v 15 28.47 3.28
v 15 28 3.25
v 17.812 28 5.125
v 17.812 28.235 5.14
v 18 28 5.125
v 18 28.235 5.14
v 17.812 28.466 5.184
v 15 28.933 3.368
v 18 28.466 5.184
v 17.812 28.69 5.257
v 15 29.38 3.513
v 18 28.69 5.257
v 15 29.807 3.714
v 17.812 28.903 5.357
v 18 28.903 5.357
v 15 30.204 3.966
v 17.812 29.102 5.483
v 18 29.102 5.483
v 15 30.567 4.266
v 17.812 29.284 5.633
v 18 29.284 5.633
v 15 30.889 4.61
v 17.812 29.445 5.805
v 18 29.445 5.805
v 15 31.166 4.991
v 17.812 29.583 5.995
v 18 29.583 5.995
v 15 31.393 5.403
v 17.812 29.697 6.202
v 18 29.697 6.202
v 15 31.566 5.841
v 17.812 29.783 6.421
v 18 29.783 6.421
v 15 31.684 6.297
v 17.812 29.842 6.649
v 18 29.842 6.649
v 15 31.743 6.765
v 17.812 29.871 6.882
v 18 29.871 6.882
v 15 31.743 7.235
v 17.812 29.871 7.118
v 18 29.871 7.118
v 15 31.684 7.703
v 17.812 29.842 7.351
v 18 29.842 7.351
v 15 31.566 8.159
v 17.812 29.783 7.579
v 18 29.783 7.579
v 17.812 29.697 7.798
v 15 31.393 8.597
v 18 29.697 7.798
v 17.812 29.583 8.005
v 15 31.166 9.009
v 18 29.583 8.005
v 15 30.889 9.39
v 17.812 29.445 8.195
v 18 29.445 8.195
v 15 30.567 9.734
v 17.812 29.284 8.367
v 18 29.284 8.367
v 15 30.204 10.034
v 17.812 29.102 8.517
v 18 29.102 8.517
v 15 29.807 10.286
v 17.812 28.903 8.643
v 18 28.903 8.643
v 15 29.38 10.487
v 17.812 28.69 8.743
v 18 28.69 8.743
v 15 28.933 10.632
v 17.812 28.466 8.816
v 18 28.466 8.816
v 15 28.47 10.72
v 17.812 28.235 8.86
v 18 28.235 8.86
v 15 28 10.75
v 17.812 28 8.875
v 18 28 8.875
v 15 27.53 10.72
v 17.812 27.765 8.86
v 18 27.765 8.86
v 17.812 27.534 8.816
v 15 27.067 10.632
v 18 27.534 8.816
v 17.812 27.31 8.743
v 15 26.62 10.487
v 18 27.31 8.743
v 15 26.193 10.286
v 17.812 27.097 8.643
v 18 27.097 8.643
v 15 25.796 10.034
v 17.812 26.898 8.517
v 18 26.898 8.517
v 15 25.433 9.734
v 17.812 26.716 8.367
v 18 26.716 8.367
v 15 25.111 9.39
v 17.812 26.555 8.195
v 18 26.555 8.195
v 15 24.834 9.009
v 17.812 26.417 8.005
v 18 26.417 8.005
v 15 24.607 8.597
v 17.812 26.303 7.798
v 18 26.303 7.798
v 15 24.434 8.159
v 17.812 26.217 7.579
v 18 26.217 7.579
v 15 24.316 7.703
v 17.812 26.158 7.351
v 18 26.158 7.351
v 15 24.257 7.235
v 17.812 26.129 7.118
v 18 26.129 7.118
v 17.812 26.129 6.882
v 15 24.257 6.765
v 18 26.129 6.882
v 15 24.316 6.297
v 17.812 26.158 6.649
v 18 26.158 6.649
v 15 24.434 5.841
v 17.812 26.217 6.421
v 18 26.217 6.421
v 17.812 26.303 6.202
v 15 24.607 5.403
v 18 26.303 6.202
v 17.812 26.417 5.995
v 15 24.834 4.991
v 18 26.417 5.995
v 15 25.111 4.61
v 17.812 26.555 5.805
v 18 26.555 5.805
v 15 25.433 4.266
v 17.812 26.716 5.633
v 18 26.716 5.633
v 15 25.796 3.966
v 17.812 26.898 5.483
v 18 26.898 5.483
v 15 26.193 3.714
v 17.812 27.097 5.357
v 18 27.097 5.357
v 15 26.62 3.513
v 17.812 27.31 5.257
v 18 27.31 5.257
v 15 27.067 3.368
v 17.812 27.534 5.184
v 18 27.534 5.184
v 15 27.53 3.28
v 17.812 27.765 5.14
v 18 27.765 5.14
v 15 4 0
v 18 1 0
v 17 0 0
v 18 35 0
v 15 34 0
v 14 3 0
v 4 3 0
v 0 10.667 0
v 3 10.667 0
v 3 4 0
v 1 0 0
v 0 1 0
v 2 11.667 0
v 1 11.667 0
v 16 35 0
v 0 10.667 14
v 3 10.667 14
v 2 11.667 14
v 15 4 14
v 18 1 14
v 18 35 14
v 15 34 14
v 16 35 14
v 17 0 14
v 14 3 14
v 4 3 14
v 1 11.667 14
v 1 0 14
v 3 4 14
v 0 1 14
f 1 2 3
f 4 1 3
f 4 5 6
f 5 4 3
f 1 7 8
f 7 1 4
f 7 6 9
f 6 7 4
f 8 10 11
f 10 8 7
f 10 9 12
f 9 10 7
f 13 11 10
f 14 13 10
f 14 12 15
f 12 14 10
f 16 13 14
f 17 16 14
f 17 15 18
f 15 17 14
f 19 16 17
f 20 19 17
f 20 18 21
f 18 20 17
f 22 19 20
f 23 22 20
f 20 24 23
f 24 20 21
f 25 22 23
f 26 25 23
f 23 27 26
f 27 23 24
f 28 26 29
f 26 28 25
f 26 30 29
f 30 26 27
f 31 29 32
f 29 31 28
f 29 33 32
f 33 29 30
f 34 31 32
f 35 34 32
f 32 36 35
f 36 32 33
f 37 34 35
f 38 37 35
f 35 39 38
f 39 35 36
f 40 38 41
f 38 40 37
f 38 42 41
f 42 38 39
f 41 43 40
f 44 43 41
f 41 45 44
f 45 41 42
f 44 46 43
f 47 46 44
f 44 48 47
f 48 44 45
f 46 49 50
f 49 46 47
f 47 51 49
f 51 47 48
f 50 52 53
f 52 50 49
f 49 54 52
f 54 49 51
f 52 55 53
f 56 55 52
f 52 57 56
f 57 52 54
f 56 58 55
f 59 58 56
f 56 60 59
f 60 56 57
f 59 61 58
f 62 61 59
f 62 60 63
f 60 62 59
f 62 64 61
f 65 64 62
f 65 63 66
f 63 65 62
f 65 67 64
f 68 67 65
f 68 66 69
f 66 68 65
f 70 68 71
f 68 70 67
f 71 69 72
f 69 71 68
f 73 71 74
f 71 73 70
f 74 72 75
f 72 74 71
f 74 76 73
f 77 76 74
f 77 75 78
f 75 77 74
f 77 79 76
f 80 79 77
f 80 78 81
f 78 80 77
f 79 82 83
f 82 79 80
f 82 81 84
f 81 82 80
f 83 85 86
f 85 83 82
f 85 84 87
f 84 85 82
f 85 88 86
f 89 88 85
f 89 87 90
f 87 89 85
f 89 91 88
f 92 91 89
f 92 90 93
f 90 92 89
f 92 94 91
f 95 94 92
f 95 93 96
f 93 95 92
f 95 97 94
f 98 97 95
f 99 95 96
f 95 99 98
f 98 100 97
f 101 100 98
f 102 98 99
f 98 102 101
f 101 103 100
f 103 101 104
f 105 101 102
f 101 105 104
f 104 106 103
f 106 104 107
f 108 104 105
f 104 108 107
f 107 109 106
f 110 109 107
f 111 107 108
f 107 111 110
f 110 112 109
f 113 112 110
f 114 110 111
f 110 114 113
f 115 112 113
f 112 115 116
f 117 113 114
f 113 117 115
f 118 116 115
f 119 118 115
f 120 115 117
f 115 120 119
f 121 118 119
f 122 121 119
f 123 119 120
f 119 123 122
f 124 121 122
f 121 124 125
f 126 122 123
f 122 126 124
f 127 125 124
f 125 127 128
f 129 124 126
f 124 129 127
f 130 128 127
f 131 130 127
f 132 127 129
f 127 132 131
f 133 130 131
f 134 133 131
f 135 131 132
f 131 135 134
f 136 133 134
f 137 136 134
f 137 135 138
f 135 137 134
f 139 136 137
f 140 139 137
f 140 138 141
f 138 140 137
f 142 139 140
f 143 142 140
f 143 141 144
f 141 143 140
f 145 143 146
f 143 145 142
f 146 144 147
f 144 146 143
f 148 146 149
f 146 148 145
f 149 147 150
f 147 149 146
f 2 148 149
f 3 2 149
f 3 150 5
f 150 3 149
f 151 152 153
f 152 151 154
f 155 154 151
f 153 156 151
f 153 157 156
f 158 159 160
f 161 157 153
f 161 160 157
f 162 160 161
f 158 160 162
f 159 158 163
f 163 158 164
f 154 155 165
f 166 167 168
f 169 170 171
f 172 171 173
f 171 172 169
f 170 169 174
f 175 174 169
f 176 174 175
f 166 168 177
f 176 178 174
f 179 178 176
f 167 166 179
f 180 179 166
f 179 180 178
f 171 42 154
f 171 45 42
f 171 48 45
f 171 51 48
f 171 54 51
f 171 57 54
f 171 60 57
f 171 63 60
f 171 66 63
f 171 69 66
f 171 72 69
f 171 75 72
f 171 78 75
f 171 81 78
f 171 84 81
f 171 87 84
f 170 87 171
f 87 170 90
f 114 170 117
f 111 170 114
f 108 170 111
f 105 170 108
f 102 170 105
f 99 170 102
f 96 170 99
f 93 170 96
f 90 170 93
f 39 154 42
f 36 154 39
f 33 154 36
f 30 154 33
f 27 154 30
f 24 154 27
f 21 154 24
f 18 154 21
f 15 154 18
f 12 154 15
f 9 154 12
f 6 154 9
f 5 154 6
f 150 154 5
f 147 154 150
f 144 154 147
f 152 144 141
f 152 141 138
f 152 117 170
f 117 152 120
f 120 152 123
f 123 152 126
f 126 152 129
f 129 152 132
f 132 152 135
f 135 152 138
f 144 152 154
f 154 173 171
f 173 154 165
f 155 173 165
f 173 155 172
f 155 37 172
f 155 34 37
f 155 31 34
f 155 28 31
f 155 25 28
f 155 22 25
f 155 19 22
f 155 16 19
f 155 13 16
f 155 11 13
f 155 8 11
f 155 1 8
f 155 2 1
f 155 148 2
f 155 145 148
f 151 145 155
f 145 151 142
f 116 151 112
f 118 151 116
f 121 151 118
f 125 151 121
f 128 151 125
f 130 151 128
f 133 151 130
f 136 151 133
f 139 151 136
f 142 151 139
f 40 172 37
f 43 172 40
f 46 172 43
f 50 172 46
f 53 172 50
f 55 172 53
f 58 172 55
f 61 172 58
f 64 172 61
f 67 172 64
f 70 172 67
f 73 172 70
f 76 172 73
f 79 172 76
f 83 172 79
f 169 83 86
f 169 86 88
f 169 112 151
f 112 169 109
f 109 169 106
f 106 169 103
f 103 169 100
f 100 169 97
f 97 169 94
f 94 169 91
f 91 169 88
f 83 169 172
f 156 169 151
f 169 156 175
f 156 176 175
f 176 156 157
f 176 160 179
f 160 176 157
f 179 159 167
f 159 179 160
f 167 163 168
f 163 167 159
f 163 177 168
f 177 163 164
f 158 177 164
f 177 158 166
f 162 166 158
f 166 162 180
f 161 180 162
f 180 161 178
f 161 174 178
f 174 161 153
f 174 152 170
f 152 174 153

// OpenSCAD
// file: Parts/Screw.scad
// created by IndiePandaaaaa | Lukas

$fn = 50;

function cone_diameter(diameter) = diameter * 2;

function cone_diameter_cutout(diameter) = diameter * 2 + 0.5;

function cone_height(diameter) = diameter * 0.75;

module screw(diameter, length = 12, cutout_sample = false) {
  module base_model(diameter, length, cone_height, cone_diameter, offset = 0) {
    rotate_extrude() {
      polygon([
          [0, 0],
          [(diameter + offset) / 2, 0],
          [(diameter + offset) / 2, (length + offset) - (cone_height + offset)],
          [(cone_diameter + offset) / 2, length + offset],
          [0, length + offset],
        ]);
    }
  }

  if (length < diameter) {
    echo("Screw is too short");
    length = diameter + 5;
    echo("New length is: ", length);
  }

  if (!cutout_sample) {
    translate([0, 0, -length])
      difference() {
        base_model(diameter, length, cone_height(diameter), cone_diameter(diameter));

        // top cross part
        translate([0, 0, length - (cone_height(diameter) - diameter / 2) + .1])
          difference() {
            rotate([0, 0, 45])
              rotate_extrude() {
                polygon([
                    [0, 0],
                    [diameter * 1.4 / 2, 0],
                    [cone_diameter(diameter) / 3, cone_height(diameter) - diameter / 2],
                    [0, cone_height(diameter) - diameter / 2],
                  ]);
              }
            for (i = [0 : 1 : 3]) {
              rotate([0, 0, 90 * i])
                translate([diameter / 3.18 / 2, diameter / 3.18 / 2, 0]) cube(cone_height(diameter));
            }
          }
      }
  } else {
    offset = 0;
    diameter = cone_diameter_cutout(diameter) / 2;  // is duplicated by function, used to reduce error
    translate([0, 0, -length - offset / 2]) {
      base_model(diameter, length, cone_height(diameter), cone_diameter(diameter), offset);
      translate([0, 0, length]) cylinder(r = diameter, h = 50);
    }
  }
}

module screw_corehole(diameter_screw, diameter_core, unthreaded_length, length = 12) {
  union() {
    screw(diameter_screw, unthreaded_length, true);
    translate([0, 0, -length]) cylinder(d = diameter_core, h = length - unthreaded_length + .1);
  }
}

translate([20, 0, 0]) screw(3.5, cutout_sample = false);
screw_corehole(diameter_screw = 3, diameter_core = 2.5, unthreaded_length = 15, length = 20);
// main file
// created by IndiePandaaaaa|Lukas

use <Parts/Screw.scad>

THICKNESS = 3.0;
SCREW_OD = 3.5;
CHAMFER = 1;

HOOK_INNER_WIDTH = 12;
DEPTH = SCREW_OD * 4;
HEIGHT = DEPTH * 2.5;

difference() {
  linear_extrude(DEPTH) {
    polygon([
        [0, CHAMFER],
        [CHAMFER, 0],
        [HOOK_INNER_WIDTH + THICKNESS * 2 - CHAMFER, 0],
        [HOOK_INNER_WIDTH + THICKNESS * 2, CHAMFER],
        [HOOK_INNER_WIDTH + THICKNESS * 2, HEIGHT],
        [HOOK_INNER_WIDTH + THICKNESS + CHAMFER, HEIGHT],
        [HOOK_INNER_WIDTH + THICKNESS, HEIGHT - CHAMFER],
        [HOOK_INNER_WIDTH + THICKNESS, THICKNESS + CHAMFER],
        [HOOK_INNER_WIDTH + THICKNESS - CHAMFER, THICKNESS],
        [THICKNESS + CHAMFER, THICKNESS],
        [THICKNESS, THICKNESS + CHAMFER],
        [THICKNESS, HEIGHT * 1 / 3 - CHAMFER],
        [THICKNESS - CHAMFER, HEIGHT * 1 / 3],
        [CHAMFER, HEIGHT * 1 / 3],
        [0, HEIGHT * 1 / 3 - CHAMFER],
      ]);
  }
  translate([HOOK_INNER_WIDTH + THICKNESS, HEIGHT - DEPTH / 2, DEPTH / 2])
    rotate([0, -90, 0])
      screw(SCREW_OD, 12, true);
}
